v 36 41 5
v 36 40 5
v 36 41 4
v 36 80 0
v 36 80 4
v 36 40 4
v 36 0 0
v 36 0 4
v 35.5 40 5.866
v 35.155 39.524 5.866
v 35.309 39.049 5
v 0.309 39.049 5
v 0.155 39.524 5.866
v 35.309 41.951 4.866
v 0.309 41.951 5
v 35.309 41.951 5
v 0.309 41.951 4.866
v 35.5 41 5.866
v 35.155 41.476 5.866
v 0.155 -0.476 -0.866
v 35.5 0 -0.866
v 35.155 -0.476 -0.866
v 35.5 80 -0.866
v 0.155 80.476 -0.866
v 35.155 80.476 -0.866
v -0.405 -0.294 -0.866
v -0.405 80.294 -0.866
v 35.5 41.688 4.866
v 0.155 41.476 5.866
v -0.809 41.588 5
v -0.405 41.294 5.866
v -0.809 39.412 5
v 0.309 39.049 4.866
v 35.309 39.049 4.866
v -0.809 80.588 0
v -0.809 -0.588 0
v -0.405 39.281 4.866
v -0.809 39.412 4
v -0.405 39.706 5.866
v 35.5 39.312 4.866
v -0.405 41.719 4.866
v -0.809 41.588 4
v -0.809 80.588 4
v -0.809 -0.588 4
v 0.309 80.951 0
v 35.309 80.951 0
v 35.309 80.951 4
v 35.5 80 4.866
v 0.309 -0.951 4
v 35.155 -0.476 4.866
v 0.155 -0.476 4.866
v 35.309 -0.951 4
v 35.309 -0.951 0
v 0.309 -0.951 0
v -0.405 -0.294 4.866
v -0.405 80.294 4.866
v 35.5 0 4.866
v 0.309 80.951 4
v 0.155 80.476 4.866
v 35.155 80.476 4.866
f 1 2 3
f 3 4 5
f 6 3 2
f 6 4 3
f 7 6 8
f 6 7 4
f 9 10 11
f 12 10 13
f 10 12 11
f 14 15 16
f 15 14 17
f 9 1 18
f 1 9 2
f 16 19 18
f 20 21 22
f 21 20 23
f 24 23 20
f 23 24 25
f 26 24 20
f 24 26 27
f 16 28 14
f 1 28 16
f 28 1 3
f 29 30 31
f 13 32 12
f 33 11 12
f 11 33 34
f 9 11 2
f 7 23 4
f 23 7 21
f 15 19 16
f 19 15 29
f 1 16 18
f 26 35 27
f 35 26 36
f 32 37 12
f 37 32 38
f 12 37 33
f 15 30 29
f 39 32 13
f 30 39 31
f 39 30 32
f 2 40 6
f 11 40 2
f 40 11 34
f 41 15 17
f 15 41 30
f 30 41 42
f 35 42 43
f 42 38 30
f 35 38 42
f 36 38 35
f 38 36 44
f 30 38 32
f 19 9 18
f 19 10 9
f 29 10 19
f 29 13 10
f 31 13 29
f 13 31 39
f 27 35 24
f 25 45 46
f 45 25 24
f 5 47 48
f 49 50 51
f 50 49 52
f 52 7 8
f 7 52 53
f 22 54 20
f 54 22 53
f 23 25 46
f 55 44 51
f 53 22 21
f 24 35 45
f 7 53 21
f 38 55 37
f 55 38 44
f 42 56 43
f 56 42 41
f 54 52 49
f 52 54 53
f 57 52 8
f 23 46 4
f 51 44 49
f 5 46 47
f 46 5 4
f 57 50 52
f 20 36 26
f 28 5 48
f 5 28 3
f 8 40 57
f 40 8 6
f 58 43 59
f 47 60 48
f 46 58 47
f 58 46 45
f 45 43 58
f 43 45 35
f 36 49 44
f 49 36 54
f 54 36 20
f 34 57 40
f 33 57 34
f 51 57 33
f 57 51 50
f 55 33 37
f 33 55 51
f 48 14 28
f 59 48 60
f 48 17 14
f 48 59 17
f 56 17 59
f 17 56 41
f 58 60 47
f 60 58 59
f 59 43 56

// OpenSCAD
// Loguncov Maxim 13.12.13


//$fn=128;


translate([0,40,0])
minkowski()
{cube([35,1,5]);
sphere(1);
}

difference() {

//основа
minkowski()
{cube([35,80,4]);
sphere(1);
}
}
